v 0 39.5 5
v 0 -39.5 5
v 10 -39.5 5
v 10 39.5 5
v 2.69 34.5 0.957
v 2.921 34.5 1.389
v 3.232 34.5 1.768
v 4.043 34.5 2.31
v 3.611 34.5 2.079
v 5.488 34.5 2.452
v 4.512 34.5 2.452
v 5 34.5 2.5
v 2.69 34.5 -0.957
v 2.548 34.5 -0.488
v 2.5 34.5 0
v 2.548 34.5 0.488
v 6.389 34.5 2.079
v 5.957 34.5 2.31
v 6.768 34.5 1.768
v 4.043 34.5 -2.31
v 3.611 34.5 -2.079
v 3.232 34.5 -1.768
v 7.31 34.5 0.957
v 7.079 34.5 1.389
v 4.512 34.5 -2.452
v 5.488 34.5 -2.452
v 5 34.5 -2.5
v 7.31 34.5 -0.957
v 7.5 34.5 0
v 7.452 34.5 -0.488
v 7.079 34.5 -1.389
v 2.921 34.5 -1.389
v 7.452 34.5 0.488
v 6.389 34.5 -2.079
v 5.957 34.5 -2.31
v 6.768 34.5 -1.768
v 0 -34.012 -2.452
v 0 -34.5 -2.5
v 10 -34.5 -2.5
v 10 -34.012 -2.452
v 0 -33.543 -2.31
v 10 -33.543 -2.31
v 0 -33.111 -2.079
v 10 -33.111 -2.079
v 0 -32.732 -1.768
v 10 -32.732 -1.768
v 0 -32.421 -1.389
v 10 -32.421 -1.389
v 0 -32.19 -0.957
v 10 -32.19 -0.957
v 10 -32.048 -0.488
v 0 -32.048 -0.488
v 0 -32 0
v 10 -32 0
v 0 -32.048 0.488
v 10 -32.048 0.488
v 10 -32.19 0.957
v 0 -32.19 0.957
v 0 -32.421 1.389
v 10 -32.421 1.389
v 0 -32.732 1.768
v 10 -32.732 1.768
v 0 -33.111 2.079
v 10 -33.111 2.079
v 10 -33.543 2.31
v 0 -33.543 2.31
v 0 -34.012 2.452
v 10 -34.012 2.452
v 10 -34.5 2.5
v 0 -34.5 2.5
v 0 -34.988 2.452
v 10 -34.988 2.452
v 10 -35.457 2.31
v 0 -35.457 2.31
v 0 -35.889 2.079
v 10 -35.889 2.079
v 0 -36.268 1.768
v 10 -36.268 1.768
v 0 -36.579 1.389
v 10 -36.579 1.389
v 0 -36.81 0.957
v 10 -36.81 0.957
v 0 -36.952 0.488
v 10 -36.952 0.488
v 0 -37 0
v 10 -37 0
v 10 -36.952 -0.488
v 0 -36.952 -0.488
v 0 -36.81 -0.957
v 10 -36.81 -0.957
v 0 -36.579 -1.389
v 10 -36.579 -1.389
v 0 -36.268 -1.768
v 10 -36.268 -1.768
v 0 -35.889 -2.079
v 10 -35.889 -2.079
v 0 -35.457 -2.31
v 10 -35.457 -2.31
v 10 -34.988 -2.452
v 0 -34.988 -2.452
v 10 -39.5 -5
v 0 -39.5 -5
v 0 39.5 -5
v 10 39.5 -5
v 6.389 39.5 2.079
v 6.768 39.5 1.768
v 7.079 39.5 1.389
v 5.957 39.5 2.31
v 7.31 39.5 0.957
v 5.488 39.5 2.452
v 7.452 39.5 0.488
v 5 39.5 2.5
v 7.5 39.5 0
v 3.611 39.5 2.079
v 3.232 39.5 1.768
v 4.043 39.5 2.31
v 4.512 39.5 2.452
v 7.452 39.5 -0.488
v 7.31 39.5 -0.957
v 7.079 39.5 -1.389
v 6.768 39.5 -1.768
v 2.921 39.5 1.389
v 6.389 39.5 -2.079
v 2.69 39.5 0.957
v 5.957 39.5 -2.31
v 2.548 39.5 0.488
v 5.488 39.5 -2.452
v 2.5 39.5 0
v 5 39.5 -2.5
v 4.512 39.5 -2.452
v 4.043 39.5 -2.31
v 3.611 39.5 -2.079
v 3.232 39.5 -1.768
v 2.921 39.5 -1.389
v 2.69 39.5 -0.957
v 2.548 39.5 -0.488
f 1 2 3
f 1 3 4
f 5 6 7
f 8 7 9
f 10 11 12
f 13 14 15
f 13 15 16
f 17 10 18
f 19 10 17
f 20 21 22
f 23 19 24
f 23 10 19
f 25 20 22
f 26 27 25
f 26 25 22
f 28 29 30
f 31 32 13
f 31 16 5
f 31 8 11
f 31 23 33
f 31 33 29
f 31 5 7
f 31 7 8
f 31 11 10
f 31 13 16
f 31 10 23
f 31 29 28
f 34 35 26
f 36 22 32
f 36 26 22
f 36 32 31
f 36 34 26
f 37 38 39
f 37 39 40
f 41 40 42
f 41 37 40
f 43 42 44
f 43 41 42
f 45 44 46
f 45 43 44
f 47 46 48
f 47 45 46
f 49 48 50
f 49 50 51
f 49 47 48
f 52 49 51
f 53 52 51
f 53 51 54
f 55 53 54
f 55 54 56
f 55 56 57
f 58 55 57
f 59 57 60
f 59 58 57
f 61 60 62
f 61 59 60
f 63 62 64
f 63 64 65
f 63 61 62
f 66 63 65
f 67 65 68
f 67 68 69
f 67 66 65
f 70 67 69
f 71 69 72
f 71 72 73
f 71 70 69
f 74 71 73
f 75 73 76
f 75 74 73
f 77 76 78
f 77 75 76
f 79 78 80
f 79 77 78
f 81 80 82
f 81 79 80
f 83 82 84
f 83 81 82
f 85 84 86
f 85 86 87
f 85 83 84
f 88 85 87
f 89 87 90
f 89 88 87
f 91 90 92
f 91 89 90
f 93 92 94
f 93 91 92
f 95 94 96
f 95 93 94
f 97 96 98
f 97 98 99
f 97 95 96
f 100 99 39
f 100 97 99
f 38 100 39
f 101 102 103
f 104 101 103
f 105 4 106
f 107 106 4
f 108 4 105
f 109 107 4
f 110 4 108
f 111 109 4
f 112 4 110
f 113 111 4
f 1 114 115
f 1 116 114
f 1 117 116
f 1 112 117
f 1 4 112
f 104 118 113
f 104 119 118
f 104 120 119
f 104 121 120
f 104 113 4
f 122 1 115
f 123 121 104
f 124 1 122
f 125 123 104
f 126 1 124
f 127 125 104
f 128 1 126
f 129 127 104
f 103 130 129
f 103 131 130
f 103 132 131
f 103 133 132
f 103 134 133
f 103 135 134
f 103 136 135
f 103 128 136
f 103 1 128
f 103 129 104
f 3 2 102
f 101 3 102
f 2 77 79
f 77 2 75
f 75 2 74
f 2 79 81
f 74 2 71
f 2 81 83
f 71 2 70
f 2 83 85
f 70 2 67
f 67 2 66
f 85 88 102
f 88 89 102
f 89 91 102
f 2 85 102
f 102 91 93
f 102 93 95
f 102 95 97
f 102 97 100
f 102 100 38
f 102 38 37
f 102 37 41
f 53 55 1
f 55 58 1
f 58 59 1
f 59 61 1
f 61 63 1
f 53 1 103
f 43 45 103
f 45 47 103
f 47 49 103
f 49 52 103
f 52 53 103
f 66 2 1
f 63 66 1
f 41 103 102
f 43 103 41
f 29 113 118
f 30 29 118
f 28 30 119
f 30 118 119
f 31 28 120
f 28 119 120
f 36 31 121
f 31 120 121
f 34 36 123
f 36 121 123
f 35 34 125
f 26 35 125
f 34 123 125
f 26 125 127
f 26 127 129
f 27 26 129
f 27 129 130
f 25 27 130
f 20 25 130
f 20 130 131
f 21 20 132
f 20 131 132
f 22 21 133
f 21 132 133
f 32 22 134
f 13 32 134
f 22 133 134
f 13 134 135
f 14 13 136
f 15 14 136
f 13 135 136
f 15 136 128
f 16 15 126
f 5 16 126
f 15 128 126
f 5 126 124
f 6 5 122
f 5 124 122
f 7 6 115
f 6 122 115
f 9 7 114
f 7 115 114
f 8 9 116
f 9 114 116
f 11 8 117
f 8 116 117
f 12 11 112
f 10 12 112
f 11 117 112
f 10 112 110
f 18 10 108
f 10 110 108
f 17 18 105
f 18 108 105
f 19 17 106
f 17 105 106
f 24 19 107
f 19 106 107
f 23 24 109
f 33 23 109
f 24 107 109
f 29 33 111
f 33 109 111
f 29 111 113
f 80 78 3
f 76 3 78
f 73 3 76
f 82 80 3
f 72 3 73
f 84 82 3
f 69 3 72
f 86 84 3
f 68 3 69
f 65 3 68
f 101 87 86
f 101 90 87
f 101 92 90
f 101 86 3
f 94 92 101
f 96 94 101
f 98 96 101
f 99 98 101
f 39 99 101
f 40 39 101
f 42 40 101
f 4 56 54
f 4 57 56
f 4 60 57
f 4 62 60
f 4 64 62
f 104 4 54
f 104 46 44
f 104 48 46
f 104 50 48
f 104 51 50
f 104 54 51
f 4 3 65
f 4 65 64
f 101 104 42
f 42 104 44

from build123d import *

# Parameters (mm, degrees)
SKETCH2_W           = 10
SKETCH2_H           = 79
SKETCH2_R           = 2.5
BOSS_EXTRUDE1_DEPTH = 10
SKETCH3_R           = 2.5
CUT_EXTRUDE1_DEPTH  = 5


with BuildPart() as part:
    # Sketch2 → Boss-Extrude1 (new body)
    with BuildSketch(Plane(origin=(0, 0, 0), x_dir=(0, 0, -1), z_dir=(1, 0, 0))):
        Rectangle(SKETCH2_W, SKETCH2_H)
        with Locations((0, -34.5)):
            Circle(SKETCH2_R, mode=Mode.SUBTRACT)
    extrude(amount=BOSS_EXTRUDE1_DEPTH)

    # Sketch3 → Cut-Extrude1 (cut)
    with BuildSketch(Plane(origin=(0, 39.5, 0), x_dir=(1, 0, 0), z_dir=(0, 1, 0))):
        with Locations((5, 0)):
            Circle(SKETCH3_R)
    extrude(amount=-CUT_EXTRUDE1_DEPTH, mode=Mode.SUBTRACT)


solid = part.part
